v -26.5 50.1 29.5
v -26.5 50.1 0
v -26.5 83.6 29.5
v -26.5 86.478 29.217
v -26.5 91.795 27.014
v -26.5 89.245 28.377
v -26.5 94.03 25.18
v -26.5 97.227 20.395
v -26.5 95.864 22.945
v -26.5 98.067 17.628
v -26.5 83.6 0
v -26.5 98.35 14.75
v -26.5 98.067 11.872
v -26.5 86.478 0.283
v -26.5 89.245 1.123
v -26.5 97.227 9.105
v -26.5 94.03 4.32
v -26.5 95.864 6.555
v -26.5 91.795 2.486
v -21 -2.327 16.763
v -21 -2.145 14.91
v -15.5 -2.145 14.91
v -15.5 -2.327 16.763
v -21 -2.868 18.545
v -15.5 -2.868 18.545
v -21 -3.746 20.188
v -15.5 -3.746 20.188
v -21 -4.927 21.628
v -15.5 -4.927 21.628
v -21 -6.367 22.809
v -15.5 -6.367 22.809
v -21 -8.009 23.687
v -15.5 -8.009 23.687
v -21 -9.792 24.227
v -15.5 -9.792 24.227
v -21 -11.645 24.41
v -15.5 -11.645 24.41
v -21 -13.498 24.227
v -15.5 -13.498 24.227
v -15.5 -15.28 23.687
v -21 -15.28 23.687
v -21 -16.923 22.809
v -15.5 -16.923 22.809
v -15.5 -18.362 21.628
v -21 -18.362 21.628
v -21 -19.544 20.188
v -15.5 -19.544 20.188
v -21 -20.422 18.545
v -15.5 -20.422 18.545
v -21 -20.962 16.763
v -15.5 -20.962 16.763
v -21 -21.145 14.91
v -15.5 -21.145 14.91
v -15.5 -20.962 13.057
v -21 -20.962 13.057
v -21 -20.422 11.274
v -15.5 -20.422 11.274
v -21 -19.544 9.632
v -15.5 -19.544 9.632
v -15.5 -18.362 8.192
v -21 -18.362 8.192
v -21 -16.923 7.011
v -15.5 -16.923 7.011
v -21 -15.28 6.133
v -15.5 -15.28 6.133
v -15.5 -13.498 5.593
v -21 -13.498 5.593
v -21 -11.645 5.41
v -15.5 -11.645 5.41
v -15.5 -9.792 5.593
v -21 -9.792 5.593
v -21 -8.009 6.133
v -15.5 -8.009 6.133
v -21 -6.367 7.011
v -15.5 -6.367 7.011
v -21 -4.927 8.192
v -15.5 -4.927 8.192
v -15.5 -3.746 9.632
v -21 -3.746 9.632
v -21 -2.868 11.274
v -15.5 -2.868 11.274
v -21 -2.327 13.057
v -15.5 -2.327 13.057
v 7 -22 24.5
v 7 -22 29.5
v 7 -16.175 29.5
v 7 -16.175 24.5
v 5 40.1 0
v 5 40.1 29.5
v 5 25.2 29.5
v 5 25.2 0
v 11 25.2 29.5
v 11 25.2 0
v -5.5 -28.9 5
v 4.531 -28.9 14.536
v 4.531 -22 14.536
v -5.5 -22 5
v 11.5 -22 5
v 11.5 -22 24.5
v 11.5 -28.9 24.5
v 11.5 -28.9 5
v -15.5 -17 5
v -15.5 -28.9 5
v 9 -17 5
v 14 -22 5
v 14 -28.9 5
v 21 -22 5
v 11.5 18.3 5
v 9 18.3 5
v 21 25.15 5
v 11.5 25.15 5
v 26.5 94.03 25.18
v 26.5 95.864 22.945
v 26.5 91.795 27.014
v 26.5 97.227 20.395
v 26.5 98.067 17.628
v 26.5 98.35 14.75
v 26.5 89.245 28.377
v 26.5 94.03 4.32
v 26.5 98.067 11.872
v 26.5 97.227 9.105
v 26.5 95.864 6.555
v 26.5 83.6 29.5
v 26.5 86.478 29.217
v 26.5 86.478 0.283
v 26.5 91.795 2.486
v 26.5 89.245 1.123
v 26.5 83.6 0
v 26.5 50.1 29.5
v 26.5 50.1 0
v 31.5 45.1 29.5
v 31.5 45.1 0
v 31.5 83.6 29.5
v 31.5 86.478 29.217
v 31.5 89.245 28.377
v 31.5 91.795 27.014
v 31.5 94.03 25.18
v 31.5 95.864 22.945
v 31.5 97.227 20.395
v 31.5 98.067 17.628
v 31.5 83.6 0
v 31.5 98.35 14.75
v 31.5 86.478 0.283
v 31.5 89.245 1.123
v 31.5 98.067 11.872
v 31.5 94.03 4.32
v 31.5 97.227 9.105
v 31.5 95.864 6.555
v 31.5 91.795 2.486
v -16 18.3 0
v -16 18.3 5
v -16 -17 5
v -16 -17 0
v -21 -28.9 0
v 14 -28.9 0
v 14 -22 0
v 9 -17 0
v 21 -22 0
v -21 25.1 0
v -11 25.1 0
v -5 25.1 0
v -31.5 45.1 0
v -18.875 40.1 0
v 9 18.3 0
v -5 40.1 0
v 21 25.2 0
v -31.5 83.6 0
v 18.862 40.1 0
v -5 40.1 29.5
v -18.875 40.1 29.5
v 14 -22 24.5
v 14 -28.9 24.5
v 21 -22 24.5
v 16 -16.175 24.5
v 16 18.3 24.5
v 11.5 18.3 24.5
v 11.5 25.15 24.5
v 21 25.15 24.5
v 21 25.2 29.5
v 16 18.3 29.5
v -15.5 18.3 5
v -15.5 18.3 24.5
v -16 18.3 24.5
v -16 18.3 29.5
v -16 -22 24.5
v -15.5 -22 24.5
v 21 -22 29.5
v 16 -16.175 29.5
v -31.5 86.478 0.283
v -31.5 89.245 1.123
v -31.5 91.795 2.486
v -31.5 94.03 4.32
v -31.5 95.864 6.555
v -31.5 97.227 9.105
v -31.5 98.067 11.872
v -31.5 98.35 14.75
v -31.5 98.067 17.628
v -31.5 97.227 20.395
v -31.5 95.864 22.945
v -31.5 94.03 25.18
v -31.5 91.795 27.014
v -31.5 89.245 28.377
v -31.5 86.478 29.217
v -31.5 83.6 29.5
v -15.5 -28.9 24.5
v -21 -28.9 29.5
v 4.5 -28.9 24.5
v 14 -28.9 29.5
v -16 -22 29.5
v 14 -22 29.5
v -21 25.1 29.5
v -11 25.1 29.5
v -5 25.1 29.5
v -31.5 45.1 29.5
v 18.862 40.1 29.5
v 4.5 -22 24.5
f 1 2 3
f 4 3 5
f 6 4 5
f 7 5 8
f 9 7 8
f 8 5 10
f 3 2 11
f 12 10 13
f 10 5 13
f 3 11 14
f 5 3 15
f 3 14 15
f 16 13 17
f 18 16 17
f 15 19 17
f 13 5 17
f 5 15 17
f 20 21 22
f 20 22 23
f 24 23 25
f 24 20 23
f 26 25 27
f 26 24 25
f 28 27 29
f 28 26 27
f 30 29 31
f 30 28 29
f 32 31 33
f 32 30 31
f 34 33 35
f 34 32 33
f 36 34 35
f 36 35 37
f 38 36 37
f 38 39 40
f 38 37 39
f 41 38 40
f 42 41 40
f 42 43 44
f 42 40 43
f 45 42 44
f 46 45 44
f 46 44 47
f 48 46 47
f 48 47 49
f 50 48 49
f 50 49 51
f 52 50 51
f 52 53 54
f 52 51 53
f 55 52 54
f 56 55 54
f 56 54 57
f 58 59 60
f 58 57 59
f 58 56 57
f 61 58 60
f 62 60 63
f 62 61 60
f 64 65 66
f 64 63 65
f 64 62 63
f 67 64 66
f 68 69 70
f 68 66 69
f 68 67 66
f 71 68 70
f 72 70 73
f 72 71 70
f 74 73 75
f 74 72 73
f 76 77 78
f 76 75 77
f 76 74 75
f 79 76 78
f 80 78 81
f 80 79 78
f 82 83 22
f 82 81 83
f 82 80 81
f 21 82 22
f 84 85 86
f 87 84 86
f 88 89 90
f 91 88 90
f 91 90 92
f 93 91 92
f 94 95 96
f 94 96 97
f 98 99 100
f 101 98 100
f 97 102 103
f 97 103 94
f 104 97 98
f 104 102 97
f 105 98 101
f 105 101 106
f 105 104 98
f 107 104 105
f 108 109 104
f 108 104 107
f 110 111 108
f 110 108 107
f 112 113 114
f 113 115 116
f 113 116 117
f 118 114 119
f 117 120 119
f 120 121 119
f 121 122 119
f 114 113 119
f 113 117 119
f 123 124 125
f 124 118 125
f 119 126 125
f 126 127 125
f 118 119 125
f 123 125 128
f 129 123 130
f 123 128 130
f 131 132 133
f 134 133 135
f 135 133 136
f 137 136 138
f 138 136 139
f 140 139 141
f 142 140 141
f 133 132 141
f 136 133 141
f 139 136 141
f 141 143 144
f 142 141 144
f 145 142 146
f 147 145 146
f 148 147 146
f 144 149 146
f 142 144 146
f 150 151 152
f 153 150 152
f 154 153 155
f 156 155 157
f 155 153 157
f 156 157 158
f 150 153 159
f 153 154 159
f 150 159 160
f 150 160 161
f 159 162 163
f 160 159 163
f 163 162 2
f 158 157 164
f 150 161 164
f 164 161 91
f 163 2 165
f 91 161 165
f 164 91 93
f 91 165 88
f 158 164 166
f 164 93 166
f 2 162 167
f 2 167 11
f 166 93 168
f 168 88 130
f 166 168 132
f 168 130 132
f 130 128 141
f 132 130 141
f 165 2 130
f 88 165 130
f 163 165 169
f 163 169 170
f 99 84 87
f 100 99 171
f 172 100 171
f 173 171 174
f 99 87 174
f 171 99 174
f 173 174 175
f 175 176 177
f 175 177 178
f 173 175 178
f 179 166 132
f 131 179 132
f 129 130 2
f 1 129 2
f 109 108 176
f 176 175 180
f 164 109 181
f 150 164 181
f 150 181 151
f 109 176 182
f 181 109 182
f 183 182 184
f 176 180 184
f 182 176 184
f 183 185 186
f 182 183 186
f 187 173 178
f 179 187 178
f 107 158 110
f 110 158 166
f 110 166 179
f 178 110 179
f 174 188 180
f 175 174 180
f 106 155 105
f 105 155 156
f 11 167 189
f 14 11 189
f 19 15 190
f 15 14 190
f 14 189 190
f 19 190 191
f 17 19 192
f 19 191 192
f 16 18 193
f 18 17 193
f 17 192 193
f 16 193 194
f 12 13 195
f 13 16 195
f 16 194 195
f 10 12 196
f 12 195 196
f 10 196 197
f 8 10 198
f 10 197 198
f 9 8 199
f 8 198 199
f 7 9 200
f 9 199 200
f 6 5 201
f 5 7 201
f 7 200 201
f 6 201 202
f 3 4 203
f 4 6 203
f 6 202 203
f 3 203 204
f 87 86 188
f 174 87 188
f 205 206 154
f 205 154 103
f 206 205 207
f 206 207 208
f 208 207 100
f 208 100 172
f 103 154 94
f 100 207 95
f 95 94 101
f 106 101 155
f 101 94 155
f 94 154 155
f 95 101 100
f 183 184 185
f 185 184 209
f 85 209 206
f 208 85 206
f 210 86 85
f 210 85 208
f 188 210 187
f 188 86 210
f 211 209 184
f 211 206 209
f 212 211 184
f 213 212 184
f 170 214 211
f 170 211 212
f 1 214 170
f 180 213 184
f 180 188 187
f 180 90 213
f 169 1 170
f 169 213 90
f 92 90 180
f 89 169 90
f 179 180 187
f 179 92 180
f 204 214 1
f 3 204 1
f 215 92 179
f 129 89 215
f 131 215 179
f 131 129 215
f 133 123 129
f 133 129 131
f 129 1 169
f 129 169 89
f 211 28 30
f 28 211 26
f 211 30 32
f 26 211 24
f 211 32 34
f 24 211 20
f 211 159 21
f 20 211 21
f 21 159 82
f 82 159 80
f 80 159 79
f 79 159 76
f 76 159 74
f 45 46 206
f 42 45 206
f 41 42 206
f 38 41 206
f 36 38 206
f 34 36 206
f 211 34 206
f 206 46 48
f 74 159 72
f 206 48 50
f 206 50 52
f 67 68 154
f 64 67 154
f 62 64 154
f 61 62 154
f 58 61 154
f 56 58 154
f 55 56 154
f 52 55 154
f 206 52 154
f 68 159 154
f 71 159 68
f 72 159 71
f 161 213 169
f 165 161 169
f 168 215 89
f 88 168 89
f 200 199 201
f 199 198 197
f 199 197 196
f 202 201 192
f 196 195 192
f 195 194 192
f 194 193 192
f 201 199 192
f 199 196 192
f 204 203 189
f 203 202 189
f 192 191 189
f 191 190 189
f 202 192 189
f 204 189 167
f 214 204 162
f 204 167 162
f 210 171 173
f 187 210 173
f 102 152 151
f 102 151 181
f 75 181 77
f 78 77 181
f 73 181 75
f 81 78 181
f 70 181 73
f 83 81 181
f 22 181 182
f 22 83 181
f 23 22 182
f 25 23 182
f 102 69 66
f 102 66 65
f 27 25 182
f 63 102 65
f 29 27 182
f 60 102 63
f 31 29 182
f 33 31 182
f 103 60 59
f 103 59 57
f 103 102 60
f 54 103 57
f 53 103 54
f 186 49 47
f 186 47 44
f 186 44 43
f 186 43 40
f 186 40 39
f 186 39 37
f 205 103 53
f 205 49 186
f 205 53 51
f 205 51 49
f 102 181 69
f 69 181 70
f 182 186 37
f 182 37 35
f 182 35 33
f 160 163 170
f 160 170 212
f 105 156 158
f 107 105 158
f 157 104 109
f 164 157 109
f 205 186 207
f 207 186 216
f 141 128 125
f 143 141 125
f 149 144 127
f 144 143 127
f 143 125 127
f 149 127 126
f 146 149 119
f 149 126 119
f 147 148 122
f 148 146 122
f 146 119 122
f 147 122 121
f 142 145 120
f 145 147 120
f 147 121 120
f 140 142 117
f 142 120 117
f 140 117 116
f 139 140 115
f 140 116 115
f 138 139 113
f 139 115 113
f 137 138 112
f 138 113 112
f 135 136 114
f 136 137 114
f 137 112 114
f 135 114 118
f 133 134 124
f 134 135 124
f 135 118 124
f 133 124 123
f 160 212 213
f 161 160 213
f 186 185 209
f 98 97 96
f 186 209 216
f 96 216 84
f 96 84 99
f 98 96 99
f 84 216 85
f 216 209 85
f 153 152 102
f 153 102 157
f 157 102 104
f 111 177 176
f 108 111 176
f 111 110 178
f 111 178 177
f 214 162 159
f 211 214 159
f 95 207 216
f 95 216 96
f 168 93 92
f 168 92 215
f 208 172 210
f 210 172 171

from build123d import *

# Parameters (mm, degrees)
PAD_DEPTH       = 29.5
POCKET_DEPTH    = 19.5
POCKET001_DEPTH = 6.9
POCKET002_DEPTH = 5
POCKET003_DEPTH = 5
SKETCH006_R     = 9.5
POCKET004_DEPTH = 56
POCKET005_DEPTH = 100


with BuildPart() as part:
    # Sketch → Pad (new body)
    with BuildSketch(Plane.XY):
        Polygon((-31.5, 98.35), (-31.5, 45.1), (-21, 25.1), (-21, -28.9), (14, -28.9), (14, -22), (21, -22), (21, 25.2), (31.5, 45.1), (31.5, 98.35), (26.5, 98.35), (26.5, 50.1), (-26.5, 50.1), (-26.5, 98.35), align=None)
        Polygon((-18.875, 40.1), (-11, 25.1), (-5, 25.1), (-5, 40.1), align=None, mode=Mode.SUBTRACT)
        Polygon((5, 40.1), (5, 25.2), (11, 25.2), (18.861809, 40.1), align=None, mode=Mode.SUBTRACT)
    extrude(amount=PAD_DEPTH)

    # Sketch001 → Pocket (cut)
    with BuildSketch(Plane.XY.offset(5)):
        Polygon((-15.5, 18.3), (-15.5, -22), (11.5, -22), (11.5, -28.9), (14, -28.9), (14, -22), (21, -22), (21, -18), (27.5, -18), (27.5, -12), (21, -12), (21, 12.3), (21, 12.3), (21, 18.3), (21, 18.3), (21, 25.15), (11.5, 25.15), (11.5, 18.3), align=None)
    extrude(amount=POCKET_DEPTH, mode=Mode.SUBTRACT)

    # Sketch003 → Pocket001 (cut)
    with BuildSketch(Plane(origin=(-15.5, -28.9, 5), x_dir=(1, 0, 0), z_dir=(0, -1, 0))):
        Polygon((20.030856, 9.535838), (10, 0), (0, 0), (0, 19.5), (20, 19.5), align=None)
    extrude(amount=-POCKET001_DEPTH, mode=Mode.SUBTRACT)

    # Sketch004 → Pocket002 (cut)
    with BuildSketch(Plane.XY.offset(5)):
        Polygon((-16, 18.3), (-16, -17), (9, -17), (9, -16.114332), (9, 18.3), align=None)
    extrude(amount=-POCKET002_DEPTH, mode=Mode.SUBTRACT)

    # Sketch005 → Pocket003 (cut)
    with BuildSketch(Plane.XY.offset(29.5)):
        Polygon((-16, 18.3), (-16, -22), (7, -22), (7, -16.175392), (16, -16.175392), (16, 18.3), align=None)
    extrude(amount=-POCKET003_DEPTH, mode=Mode.SUBTRACT)

    # Sketch006 → Pocket004 (cut)
    with BuildSketch(Plane(origin=(-22, -27.65, 3), x_dir=(0, 1, 0), z_dir=(1, 0, 0))):
        with Locations((16.005131, 11.909992)):
            Circle(SKETCH006_R)
    extrude(amount=POCKET004_DEPTH, mode=Mode.SUBTRACT)

    # Sketch007 → Pocket005 (cut)
    with BuildSketch(Plane(origin=(-50, 83.6, 14.75), x_dir=(0, 1, 0), z_dir=(1, 0, 0))):
        with BuildLine():
            ThreePointArc((4.2e-05, -14.75), (14.75, 3.4e-05), (-2.6e-05, 14.75))
            Line((-2.6e-05, 14.75), (14.750042, 14.750026))
            Line((14.750042, 14.750026), (14.750042, -14.75))
            Line((14.750042, -14.75), (4.2e-05, -14.75))
        make_face()
    extrude(amount=POCKET005_DEPTH, mode=Mode.SUBTRACT)


solid = part.part
